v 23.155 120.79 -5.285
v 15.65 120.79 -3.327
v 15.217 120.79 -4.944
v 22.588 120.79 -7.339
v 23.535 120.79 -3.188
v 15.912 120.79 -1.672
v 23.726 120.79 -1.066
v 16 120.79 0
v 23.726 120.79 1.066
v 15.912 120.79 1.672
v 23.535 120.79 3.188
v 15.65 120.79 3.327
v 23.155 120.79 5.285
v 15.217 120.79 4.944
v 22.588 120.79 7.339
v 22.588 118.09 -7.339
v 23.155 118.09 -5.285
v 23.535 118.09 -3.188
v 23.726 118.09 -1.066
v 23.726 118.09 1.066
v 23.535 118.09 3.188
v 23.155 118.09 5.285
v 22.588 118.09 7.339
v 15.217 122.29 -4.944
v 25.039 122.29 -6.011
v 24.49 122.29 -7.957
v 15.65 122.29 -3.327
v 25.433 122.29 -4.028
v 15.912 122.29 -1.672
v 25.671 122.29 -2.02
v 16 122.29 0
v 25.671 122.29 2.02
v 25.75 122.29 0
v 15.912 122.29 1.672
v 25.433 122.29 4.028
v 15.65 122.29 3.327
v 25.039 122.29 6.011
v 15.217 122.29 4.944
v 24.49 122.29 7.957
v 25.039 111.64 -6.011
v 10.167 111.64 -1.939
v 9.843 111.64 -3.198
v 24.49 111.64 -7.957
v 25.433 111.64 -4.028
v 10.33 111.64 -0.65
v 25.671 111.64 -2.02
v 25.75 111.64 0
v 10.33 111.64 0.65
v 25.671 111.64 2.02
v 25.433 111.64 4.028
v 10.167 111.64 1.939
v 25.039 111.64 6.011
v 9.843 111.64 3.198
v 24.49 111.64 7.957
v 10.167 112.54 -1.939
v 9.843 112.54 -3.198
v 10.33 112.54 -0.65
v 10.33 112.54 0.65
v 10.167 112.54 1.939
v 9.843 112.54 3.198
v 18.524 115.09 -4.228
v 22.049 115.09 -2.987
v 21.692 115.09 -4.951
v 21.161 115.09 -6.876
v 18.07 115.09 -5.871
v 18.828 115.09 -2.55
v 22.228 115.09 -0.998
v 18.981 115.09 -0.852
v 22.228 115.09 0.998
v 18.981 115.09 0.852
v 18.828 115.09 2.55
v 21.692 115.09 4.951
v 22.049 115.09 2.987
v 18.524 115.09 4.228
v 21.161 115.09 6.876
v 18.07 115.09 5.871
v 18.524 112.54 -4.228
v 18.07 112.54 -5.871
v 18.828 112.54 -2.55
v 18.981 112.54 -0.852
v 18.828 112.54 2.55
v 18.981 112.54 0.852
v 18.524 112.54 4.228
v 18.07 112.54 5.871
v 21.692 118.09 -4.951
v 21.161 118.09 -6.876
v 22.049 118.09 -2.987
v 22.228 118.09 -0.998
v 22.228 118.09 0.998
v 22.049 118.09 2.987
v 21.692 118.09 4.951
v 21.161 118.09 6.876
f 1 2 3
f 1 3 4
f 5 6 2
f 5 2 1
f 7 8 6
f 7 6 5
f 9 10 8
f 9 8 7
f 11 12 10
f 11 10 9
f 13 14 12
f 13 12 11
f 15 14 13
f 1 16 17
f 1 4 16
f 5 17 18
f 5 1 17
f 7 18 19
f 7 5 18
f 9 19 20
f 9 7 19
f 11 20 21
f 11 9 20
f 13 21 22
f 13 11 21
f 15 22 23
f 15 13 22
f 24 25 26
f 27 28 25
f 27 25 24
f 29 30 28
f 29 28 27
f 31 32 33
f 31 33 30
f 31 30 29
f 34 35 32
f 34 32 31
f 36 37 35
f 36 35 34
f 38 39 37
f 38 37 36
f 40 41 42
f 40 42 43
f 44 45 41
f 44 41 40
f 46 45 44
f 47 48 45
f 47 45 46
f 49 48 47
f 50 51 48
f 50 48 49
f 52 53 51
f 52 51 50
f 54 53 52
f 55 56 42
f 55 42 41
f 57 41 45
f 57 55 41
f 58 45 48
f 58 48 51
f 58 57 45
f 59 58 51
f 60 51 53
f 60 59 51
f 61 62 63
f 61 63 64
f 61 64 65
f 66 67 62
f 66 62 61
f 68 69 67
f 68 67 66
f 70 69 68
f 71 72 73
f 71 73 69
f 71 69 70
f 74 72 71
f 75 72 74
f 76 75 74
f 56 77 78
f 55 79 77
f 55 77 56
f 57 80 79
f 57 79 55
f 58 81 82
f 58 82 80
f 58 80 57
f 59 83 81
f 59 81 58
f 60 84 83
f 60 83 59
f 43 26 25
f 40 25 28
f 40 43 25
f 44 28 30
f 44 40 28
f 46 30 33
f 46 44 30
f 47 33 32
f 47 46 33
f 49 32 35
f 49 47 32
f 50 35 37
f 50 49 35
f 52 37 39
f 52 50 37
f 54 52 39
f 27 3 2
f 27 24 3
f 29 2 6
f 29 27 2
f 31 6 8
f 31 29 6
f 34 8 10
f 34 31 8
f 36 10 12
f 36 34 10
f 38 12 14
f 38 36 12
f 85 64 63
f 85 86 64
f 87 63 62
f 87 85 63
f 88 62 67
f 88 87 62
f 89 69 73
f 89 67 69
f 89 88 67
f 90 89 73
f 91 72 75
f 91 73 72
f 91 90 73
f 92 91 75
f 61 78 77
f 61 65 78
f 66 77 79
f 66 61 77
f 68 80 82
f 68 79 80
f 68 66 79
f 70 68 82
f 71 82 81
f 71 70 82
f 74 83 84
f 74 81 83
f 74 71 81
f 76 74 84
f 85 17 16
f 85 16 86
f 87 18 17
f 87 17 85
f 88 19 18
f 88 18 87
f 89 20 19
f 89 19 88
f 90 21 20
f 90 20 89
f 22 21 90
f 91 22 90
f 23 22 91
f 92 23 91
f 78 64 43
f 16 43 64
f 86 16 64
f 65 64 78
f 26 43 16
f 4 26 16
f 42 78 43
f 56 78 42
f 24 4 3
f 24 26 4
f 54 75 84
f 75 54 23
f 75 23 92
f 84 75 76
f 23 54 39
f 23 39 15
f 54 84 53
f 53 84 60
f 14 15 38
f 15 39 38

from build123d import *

# Parameters (mm, degrees)
REVOLVE1_ANGLE           = 18
REVOLVE1_OTHER_WAY_ANGLE = 18


with BuildPart() as part:
    # Sketch2 → Revolve1 (revolve)
    with BuildSketch(Plane.XY):
        Polygon((10.35, 112.53957189), (19, 112.53957189), (19, 115.08957189), (22.25, 115.08957189), (22.25, 118.08957189), (23.75, 118.08957189), (23.75, 120.78957189), (16, 120.78957189), (16, 122.28957189), (25.75, 122.28957189), (25.75, 111.63957189), (10.35, 111.63957189), align=None)
    revolve(axis=Axis((0, -1000, 0), (0, 1, 0)), revolution_arc=REVOLVE1_ANGLE)

    # Sketch2 → Revolve1 other way (revolve)
    with BuildSketch(Plane.XY):
        Polygon((10.35, 112.53957189), (19, 112.53957189), (19, 115.08957189), (22.25, 115.08957189), (22.25, 118.08957189), (23.75, 118.08957189), (23.75, 120.78957189), (16, 120.78957189), (16, 122.28957189), (25.75, 122.28957189), (25.75, 111.63957189), (10.35, 111.63957189), align=None)
    revolve(axis=Axis((0, -1000, 0), (0, -1, 0)), revolution_arc=REVOLVE1_OTHER_WAY_ANGLE)


solid = part.part
